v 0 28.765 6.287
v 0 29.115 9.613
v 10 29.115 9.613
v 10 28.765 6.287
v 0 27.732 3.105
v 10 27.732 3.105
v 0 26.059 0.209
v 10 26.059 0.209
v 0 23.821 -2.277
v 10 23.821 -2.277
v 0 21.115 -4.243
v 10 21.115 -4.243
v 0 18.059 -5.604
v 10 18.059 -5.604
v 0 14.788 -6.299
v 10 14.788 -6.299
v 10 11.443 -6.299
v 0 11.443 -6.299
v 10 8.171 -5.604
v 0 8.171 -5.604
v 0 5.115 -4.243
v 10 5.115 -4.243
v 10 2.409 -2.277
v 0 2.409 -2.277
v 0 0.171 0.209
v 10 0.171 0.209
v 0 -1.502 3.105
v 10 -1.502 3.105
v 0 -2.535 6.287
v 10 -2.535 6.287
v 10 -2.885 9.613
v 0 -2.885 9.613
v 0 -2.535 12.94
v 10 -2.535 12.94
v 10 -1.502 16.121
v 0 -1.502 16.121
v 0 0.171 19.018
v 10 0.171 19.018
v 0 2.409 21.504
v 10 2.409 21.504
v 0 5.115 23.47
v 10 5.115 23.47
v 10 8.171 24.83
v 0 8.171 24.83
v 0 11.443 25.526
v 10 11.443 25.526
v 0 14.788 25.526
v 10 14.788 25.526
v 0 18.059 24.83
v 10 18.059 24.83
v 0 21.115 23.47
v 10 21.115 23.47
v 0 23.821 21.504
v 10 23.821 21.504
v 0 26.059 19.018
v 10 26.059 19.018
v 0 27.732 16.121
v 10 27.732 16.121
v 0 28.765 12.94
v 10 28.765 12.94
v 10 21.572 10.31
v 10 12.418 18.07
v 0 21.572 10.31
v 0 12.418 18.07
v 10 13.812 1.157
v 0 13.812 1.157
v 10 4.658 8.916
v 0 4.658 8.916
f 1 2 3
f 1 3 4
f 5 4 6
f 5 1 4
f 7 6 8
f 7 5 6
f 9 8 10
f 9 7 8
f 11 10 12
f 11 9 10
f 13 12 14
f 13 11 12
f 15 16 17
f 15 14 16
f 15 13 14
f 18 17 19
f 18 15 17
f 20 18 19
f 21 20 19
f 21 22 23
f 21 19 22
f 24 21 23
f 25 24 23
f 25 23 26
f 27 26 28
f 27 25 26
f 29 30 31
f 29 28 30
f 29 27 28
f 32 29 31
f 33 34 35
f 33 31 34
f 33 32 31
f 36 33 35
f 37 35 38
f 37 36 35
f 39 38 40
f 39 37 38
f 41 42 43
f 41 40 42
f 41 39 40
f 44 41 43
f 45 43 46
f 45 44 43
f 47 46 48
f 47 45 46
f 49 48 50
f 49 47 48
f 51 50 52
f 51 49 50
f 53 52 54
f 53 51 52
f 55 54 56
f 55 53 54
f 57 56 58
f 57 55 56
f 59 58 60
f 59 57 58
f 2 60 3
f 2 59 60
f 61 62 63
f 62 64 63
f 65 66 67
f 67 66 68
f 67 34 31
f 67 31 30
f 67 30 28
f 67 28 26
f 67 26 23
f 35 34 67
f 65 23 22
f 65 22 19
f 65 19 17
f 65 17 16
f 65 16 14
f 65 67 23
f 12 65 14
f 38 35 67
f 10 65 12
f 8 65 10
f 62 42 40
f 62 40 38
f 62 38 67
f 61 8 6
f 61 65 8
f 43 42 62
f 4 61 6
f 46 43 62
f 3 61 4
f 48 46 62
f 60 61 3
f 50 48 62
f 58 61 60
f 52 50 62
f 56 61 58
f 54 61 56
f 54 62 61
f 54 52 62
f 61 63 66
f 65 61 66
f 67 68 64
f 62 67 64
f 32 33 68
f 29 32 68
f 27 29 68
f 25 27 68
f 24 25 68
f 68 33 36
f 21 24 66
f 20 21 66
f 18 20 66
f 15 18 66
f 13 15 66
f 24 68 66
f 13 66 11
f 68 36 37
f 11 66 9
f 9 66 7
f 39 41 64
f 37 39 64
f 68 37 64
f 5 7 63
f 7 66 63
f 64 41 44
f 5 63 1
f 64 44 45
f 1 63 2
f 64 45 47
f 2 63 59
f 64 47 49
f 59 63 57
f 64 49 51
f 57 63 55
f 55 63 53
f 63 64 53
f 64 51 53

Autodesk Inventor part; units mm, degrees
ref_plane "YZ Plane" through (0, 0, 0) normal (1, 0, 0) x (0, 1, 0)
ref_plane "XZ Plane" through (0, 0, 0) normal (0, 1, 0) x (-1, 0, 0)
ref_plane "XY Plane" through (0, 0, 0) normal (0, 0, 1) x (1, 0, 0)
sketch "Эскиз1" plane through (0, 0, 0) normal (1, 0, 0) x (0, 1, 0)
  circle A0 centre (13.1151, 9.6132) radius 16
  line L0 (12.4181, 18.0698) -> (21.5717, 10.3101)
  line L1 (21.5717, 10.3101) -> (13.812, 1.1566)
  line L2 (13.812, 1.1566) -> (4.6584, 8.9163)
  line L3 (4.6584, 8.9163) -> (12.4181, 18.0698)
  line L4 (12.4181, 18.0698) -> (13.812, 1.1566) construction
  point P0 (0, 0)
  dimension "d0" = 32
  dimension "d2" = 12
extrude "Выдавливание1" add sketch "Эскиз1" along normal blind 10
properties part number "Задание номер 7"
